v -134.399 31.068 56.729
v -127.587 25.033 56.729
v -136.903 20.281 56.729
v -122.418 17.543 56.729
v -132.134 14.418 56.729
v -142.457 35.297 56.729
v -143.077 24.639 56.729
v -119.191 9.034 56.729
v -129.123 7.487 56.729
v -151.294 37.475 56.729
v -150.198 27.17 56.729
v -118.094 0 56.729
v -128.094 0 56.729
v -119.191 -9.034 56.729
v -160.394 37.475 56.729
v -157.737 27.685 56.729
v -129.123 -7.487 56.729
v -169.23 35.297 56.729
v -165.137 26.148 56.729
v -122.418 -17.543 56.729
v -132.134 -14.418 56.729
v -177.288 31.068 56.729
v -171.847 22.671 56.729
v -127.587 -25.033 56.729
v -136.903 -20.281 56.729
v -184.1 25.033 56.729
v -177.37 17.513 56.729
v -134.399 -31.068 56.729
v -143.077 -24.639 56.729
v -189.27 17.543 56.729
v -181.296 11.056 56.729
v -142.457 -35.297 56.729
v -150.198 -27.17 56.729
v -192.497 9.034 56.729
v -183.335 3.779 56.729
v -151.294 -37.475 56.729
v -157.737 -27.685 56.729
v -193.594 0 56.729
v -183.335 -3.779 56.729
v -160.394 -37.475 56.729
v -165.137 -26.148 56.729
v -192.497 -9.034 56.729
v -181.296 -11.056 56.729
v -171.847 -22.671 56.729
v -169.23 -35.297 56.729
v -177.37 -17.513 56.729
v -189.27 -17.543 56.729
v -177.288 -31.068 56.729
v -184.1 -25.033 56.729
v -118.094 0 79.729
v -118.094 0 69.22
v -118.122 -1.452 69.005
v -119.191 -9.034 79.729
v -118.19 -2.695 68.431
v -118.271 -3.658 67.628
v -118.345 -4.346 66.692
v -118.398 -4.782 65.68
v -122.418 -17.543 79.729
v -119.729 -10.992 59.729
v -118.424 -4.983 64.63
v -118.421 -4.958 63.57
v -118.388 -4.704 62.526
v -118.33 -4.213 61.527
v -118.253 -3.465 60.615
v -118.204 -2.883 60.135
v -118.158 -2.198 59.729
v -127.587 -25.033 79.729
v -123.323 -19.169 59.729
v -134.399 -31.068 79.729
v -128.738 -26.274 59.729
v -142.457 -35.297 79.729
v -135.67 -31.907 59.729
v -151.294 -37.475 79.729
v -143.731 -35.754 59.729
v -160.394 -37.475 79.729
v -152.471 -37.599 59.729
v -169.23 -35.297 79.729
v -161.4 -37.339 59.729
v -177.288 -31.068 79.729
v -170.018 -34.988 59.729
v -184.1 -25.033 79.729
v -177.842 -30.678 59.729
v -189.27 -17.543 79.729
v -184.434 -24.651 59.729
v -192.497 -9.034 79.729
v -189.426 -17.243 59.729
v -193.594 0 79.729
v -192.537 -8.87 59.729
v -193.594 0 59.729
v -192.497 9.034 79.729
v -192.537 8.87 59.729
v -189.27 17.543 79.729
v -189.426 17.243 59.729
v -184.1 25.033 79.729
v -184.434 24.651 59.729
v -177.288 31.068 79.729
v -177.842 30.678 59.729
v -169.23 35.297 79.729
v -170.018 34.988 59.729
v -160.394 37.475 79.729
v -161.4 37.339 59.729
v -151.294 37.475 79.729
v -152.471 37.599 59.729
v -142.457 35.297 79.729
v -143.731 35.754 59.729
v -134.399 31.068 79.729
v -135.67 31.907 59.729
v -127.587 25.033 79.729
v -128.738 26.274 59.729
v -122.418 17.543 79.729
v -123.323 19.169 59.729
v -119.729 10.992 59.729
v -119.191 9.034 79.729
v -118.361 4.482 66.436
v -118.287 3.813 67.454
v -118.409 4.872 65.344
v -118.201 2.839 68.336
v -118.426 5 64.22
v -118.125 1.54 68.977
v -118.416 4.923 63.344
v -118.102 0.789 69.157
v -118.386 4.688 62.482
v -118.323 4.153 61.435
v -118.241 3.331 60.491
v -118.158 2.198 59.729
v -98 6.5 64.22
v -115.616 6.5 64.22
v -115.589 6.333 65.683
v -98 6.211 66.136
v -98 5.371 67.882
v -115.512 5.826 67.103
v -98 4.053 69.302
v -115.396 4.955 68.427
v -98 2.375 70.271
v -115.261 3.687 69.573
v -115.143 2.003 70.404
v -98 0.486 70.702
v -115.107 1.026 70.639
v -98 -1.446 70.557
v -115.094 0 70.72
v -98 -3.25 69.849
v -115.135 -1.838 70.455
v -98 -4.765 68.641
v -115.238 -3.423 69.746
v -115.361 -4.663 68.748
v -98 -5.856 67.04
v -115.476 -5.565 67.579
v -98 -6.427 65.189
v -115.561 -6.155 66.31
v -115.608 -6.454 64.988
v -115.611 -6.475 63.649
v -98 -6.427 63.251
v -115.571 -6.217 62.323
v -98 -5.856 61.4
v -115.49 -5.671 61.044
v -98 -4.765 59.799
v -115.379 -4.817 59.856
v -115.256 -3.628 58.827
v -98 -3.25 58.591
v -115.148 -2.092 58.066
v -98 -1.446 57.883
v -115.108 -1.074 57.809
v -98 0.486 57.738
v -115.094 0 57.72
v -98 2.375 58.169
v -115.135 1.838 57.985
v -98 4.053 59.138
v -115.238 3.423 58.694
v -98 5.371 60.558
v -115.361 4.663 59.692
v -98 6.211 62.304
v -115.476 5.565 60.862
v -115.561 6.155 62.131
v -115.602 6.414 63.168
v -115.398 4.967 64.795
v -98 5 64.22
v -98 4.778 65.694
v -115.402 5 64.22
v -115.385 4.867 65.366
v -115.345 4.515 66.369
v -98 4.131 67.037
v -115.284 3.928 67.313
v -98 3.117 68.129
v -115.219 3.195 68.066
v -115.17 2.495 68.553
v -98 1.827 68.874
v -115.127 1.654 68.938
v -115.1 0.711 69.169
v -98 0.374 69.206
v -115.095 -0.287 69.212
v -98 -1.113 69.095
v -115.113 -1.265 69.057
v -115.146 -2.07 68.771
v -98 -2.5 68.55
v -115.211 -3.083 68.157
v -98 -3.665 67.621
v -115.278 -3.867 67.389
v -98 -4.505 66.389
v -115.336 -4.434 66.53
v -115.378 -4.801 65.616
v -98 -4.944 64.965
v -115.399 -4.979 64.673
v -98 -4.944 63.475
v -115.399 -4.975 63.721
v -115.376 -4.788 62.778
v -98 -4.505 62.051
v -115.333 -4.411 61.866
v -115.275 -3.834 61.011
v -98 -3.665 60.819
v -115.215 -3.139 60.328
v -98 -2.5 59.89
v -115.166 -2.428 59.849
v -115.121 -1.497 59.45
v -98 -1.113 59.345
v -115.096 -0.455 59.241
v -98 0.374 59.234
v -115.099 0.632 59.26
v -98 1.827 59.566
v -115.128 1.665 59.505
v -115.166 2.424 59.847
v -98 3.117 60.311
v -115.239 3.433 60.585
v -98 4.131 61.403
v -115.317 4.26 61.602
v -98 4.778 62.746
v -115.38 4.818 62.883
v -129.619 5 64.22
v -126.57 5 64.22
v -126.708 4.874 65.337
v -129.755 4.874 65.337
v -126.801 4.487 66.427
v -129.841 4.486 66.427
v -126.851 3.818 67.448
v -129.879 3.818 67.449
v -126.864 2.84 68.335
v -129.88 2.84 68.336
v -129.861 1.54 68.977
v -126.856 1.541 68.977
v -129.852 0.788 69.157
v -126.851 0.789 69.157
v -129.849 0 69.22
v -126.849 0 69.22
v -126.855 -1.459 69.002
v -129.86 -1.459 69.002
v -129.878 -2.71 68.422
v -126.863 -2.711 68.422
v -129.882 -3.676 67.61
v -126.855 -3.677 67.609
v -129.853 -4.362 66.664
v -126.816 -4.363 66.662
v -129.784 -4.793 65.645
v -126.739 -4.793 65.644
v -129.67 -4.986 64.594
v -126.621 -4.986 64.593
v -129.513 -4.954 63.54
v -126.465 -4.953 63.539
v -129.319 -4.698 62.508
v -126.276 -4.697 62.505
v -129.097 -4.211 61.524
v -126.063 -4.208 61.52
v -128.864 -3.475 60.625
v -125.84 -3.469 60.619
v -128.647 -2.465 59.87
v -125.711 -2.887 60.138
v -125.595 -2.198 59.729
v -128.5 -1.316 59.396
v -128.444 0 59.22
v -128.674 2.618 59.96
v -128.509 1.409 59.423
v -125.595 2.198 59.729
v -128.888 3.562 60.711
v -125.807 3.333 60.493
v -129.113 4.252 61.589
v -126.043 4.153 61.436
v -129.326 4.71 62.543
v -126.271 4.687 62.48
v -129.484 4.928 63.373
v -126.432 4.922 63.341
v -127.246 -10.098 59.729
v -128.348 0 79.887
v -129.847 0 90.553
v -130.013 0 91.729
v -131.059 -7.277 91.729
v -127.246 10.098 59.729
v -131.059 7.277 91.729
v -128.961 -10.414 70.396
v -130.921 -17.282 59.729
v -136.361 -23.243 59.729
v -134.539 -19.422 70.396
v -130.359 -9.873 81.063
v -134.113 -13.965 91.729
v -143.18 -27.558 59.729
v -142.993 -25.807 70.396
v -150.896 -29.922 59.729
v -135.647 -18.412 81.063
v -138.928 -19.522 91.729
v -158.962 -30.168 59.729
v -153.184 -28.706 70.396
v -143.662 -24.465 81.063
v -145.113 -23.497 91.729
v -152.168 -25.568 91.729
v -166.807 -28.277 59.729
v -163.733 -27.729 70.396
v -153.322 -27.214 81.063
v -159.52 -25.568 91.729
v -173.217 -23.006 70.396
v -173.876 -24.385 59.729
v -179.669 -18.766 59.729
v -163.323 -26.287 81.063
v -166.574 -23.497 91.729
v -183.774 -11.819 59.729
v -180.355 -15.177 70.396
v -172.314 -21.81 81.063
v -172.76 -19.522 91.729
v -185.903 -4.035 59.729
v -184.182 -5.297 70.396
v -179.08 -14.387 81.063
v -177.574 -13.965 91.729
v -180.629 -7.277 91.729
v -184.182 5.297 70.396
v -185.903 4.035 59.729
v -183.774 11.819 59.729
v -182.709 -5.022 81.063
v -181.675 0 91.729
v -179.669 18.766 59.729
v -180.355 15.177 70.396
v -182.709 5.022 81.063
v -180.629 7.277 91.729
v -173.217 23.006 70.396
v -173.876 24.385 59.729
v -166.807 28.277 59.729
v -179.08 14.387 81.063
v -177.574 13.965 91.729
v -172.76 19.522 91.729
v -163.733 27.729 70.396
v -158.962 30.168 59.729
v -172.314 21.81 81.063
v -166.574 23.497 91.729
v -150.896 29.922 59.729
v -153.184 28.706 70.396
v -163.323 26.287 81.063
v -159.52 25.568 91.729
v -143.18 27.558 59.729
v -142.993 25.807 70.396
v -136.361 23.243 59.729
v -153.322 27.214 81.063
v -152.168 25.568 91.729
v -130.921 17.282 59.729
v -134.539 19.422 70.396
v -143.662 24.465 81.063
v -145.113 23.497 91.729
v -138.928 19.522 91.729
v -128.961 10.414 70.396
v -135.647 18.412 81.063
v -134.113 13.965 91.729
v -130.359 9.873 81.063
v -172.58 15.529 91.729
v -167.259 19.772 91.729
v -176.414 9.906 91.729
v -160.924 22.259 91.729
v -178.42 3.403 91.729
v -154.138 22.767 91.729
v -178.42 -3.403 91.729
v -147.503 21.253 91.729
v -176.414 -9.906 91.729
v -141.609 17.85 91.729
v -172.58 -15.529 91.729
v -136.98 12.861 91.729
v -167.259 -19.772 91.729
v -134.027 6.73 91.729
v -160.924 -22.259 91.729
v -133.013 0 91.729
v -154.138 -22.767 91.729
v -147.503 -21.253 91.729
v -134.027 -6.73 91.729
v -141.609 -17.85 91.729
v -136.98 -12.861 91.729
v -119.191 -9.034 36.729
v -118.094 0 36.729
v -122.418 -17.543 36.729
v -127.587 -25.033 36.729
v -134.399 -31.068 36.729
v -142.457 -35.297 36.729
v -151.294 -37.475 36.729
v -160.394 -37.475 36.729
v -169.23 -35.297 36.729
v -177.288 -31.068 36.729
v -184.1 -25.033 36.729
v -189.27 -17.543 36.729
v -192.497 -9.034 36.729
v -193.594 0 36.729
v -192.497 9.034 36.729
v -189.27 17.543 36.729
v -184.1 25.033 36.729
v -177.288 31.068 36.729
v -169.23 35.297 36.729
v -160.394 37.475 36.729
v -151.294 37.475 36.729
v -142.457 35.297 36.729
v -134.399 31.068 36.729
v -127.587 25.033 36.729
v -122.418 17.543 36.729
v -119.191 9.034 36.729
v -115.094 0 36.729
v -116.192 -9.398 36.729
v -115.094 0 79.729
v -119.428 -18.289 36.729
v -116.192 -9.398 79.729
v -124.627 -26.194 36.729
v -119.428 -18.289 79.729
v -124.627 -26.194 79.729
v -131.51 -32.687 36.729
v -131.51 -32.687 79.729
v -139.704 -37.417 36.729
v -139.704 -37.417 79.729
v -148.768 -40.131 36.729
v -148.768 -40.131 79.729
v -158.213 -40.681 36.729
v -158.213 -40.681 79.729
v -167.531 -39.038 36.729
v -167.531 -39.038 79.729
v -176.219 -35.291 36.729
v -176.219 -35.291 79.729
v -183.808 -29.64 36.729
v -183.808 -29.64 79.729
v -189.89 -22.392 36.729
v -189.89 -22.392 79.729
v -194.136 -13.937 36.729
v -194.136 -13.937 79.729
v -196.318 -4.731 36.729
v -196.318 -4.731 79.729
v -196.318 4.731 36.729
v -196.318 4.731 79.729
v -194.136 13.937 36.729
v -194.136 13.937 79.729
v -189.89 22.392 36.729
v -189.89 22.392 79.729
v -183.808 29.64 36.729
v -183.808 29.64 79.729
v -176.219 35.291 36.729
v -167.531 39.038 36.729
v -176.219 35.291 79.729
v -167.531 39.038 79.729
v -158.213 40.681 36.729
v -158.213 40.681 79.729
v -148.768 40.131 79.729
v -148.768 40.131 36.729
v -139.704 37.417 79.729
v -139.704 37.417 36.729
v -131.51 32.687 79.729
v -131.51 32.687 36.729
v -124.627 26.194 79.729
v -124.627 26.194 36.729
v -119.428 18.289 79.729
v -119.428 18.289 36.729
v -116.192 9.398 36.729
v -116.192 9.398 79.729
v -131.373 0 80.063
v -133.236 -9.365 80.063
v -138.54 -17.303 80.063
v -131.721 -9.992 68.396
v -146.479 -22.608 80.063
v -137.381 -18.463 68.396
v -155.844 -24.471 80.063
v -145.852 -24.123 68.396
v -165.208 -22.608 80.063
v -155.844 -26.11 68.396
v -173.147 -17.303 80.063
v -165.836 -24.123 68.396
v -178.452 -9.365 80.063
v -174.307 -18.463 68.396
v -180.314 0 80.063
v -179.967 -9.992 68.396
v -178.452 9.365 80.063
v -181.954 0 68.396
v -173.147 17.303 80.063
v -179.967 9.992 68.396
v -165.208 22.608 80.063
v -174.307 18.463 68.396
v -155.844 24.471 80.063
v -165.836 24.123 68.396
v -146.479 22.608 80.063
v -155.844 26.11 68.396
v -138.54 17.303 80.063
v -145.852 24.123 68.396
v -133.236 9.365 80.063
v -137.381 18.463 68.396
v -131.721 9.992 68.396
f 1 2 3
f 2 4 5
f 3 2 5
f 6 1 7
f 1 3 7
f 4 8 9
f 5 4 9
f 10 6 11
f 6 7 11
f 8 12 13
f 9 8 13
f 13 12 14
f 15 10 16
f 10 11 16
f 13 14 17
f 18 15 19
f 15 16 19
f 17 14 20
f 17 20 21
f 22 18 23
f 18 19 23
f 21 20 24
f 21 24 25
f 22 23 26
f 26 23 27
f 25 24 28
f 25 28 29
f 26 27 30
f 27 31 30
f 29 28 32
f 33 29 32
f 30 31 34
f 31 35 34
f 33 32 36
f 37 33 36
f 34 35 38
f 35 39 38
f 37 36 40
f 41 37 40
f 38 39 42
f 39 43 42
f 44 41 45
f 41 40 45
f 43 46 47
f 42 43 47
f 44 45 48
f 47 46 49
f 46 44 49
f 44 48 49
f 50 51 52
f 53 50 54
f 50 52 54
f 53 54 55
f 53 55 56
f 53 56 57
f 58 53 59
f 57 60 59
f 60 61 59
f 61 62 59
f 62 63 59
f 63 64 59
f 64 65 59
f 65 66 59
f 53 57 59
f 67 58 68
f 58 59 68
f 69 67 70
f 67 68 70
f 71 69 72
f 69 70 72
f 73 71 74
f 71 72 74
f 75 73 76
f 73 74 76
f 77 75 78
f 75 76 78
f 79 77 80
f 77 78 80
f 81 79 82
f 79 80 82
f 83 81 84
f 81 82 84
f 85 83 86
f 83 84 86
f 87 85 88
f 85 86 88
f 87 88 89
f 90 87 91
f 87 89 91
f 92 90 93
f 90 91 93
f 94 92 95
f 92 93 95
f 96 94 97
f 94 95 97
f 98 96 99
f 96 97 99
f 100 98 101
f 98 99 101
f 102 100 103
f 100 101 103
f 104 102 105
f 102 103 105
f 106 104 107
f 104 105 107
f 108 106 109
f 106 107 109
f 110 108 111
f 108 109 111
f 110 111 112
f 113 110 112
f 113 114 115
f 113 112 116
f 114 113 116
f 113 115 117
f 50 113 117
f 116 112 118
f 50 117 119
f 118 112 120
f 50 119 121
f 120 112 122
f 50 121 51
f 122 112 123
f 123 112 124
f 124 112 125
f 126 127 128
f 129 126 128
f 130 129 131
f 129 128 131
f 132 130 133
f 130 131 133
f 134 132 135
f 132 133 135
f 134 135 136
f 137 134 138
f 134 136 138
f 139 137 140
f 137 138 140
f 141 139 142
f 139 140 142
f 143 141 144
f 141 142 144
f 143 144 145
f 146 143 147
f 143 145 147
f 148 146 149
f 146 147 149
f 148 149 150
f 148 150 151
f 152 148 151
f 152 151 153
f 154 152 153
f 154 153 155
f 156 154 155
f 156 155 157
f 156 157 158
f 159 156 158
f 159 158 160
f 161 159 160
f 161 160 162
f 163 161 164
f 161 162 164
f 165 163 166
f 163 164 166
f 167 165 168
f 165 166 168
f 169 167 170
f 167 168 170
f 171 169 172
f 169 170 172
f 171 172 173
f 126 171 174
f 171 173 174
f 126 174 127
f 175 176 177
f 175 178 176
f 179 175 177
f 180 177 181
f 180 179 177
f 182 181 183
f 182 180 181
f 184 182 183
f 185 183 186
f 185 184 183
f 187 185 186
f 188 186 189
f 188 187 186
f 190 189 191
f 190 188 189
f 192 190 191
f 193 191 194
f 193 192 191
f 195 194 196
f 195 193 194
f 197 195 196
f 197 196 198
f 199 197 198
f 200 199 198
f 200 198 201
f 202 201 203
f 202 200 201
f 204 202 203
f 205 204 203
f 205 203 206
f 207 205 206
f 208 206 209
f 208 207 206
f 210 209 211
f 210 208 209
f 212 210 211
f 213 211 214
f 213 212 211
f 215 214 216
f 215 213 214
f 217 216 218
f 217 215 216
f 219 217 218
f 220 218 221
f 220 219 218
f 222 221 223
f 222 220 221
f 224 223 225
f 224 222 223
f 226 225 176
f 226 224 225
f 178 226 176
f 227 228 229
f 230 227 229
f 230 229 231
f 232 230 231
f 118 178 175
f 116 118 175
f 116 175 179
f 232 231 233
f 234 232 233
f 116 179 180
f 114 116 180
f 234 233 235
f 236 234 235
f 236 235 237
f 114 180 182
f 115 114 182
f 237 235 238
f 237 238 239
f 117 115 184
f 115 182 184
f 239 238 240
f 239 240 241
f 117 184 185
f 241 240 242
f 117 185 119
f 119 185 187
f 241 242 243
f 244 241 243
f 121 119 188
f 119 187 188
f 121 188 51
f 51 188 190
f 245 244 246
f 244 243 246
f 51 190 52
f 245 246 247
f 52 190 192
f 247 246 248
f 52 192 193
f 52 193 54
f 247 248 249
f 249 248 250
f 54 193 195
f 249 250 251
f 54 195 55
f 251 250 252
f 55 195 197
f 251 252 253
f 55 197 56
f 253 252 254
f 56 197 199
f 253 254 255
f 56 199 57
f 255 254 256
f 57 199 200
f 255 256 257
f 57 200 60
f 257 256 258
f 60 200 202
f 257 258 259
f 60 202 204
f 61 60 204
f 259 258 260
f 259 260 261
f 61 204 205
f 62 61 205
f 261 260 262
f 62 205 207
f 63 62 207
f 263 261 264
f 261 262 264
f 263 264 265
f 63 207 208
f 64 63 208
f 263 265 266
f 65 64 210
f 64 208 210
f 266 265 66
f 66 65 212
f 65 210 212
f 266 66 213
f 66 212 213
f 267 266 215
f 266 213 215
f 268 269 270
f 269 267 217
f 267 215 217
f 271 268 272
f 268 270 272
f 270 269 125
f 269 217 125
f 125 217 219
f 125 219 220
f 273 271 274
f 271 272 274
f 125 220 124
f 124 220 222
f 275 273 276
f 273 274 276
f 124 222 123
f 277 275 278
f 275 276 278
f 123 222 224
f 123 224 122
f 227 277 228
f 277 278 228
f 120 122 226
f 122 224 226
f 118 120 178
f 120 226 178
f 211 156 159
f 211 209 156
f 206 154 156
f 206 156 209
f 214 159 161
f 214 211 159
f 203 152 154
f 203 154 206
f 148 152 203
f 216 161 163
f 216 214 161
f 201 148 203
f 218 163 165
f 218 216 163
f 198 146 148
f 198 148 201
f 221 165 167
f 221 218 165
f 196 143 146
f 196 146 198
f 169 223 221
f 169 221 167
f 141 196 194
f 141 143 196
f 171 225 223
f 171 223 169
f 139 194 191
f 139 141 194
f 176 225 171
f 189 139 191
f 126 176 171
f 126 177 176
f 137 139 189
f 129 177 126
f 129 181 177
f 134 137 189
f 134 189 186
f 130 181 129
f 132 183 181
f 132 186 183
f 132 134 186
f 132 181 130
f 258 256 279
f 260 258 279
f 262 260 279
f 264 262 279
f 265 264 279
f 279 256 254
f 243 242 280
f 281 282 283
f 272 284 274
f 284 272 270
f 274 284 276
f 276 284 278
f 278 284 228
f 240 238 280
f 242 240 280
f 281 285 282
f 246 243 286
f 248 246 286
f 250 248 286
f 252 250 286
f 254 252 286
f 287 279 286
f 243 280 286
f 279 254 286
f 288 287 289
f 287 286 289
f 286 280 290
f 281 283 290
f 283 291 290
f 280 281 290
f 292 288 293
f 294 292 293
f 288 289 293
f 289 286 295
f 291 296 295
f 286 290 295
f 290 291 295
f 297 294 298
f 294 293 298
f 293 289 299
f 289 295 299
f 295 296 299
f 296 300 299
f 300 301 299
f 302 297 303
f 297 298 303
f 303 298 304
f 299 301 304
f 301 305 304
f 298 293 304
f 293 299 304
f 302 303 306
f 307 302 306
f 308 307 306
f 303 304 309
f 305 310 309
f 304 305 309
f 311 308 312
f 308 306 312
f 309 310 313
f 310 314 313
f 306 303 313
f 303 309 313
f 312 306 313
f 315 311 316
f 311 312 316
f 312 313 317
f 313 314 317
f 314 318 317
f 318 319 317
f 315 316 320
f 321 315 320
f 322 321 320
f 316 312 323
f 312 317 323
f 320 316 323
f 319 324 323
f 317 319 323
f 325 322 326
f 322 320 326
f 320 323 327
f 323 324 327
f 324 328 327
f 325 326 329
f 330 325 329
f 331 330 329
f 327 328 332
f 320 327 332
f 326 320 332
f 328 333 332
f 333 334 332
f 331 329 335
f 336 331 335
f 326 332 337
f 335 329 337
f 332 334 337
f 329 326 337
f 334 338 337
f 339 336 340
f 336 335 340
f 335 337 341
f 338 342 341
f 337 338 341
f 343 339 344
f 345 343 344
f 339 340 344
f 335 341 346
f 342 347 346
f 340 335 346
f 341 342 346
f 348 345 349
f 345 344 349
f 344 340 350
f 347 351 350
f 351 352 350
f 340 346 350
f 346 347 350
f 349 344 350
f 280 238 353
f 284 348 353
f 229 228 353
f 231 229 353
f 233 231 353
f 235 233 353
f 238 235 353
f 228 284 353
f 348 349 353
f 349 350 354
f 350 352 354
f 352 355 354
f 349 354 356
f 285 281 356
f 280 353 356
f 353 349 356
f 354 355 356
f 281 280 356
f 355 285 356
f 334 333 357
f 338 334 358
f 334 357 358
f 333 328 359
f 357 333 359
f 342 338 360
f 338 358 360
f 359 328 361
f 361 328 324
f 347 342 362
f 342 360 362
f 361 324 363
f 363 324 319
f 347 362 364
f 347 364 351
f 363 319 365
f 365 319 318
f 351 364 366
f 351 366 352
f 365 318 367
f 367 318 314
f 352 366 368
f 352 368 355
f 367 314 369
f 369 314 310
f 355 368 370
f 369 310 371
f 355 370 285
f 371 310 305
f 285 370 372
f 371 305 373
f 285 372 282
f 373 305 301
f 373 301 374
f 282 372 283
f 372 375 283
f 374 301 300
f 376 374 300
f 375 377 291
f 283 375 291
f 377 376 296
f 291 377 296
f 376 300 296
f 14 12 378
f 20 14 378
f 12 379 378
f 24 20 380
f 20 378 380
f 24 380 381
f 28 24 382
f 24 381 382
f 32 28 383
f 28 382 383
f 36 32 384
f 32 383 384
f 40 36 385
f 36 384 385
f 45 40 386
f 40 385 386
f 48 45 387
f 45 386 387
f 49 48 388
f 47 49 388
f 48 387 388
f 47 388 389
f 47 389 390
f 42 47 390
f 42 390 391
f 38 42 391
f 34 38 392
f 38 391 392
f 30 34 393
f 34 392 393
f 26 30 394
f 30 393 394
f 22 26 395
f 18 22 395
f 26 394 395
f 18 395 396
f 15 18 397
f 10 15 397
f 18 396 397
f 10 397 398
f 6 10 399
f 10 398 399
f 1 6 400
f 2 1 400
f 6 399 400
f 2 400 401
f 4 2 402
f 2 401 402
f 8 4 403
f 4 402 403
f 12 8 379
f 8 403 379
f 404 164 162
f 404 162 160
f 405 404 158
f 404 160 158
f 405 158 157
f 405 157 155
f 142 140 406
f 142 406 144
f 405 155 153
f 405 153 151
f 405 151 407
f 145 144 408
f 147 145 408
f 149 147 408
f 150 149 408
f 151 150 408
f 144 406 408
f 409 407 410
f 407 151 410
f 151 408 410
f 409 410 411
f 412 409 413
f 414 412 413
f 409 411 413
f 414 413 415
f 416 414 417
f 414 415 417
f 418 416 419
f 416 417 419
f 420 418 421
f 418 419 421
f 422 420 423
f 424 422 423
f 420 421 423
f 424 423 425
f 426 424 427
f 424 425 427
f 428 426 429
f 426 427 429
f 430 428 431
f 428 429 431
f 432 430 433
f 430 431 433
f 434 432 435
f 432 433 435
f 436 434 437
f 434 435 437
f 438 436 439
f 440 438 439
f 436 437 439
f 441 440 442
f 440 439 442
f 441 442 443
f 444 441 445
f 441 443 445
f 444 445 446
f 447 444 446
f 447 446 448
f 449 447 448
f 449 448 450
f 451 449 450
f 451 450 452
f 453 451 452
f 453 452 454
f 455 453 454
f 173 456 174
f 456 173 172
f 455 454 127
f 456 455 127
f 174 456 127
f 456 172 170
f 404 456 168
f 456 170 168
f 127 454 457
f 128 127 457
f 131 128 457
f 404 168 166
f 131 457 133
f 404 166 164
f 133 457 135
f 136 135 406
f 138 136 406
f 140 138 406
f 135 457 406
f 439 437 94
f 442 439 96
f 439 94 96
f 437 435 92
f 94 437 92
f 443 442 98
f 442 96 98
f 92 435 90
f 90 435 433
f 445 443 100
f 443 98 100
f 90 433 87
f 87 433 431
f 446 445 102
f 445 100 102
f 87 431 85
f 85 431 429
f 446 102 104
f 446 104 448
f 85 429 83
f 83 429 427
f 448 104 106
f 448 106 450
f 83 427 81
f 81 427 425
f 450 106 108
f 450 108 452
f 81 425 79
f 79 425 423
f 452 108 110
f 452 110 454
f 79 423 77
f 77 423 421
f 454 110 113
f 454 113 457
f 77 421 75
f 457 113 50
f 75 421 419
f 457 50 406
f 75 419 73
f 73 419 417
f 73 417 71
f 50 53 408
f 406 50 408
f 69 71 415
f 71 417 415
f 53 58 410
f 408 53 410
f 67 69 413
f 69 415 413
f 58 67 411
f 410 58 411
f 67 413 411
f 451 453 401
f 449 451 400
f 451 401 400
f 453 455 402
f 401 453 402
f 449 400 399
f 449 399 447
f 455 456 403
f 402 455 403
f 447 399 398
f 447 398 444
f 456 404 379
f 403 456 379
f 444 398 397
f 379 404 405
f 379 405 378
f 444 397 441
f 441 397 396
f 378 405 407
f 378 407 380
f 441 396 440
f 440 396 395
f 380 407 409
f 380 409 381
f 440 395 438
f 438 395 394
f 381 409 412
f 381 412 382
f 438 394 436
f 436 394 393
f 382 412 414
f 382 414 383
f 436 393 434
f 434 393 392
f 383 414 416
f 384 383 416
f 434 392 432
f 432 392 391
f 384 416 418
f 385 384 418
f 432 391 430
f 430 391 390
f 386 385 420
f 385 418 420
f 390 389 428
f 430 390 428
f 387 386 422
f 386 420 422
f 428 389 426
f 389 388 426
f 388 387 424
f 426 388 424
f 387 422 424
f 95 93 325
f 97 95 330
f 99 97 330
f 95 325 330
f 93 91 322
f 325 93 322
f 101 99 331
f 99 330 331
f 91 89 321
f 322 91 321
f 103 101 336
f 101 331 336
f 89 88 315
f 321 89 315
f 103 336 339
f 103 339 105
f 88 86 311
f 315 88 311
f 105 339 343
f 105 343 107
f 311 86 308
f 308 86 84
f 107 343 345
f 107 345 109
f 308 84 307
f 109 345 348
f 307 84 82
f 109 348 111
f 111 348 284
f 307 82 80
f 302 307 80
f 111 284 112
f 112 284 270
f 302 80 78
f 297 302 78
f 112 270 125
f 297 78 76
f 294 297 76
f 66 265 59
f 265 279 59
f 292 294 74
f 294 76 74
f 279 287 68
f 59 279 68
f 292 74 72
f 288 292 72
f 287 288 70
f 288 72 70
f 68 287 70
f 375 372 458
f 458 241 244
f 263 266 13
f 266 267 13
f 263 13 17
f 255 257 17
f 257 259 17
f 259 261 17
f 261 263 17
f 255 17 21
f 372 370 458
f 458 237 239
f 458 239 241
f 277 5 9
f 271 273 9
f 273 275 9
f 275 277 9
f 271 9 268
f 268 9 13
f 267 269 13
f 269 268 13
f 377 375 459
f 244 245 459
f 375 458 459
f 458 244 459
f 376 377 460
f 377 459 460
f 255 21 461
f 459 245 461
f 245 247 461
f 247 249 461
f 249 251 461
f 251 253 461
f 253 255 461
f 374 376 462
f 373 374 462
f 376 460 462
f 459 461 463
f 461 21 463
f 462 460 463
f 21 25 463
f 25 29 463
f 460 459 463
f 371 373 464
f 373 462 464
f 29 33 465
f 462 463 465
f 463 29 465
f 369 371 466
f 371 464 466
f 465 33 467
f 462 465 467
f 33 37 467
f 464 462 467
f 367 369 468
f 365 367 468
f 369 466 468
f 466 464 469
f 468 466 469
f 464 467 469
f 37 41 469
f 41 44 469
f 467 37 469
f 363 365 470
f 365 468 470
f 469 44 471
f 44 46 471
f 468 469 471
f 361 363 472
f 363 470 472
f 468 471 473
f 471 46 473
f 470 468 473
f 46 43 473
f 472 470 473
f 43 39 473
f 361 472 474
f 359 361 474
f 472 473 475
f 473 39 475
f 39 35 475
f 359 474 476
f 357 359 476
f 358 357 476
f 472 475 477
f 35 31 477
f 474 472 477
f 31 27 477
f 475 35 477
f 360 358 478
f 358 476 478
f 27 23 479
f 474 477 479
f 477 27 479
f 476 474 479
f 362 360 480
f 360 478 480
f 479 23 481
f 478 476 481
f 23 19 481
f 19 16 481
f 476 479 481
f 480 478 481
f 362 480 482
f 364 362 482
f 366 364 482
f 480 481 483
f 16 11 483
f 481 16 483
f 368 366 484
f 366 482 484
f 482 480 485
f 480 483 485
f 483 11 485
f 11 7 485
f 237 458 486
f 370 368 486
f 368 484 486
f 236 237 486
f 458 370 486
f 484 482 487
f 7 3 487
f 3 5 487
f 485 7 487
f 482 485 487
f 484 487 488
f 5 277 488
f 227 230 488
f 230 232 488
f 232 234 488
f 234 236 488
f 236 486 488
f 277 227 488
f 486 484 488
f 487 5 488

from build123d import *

# Parameters (mm, degrees)
F3_R     = 6.5
F3_R_2   = 5
F4_DEPTH = 20
F5_DEPTH = 14.3


with BuildPart() as f1:
    # F0 (on Front) → F1 (revolve)
    with BuildSketch(Plane.XZ):
        Polygon((-130.0127011951, 91.7292905117), (-133.0127011951, 91.7292905117), (-128.0937719805, 56.7292905117), (-118.0937719805, 56.7292905117), (-118.0937719805, 36.7292905117), (-115.0937719805, 36.7292905117), (-115.0937719805, 79.7292905117), (-118.0937719805, 79.7292905117), (-118.0937719805, 59.7292905117), (-125.5153944847, 59.7292905117), align=None)
    revolve(axis=Axis((-155.8437719805, 0, 54.1304184761), (0, 0, -1)))

    # F3 (on offset) → F4 (join)
    with BuildSketch(Plane.YZ.offset(-118)):
        with Locations((0, 64.2200395022)):
            Circle(F3_R)
        with Locations((0, 64.2200395022)):
            Circle(F3_R_2, mode=Mode.SUBTRACT)
    extrude(amount=F4_DEPTH)

    # F3 (on offset) → F5 (cut, symmetric)
    with BuildSketch(Plane.YZ.offset(-118)):
        with Locations((0, 64.2200395022)):
            Circle(F3_R_2)
    extrude(amount=F5_DEPTH, both=True, mode=Mode.SUBTRACT)


solid = f1.part
